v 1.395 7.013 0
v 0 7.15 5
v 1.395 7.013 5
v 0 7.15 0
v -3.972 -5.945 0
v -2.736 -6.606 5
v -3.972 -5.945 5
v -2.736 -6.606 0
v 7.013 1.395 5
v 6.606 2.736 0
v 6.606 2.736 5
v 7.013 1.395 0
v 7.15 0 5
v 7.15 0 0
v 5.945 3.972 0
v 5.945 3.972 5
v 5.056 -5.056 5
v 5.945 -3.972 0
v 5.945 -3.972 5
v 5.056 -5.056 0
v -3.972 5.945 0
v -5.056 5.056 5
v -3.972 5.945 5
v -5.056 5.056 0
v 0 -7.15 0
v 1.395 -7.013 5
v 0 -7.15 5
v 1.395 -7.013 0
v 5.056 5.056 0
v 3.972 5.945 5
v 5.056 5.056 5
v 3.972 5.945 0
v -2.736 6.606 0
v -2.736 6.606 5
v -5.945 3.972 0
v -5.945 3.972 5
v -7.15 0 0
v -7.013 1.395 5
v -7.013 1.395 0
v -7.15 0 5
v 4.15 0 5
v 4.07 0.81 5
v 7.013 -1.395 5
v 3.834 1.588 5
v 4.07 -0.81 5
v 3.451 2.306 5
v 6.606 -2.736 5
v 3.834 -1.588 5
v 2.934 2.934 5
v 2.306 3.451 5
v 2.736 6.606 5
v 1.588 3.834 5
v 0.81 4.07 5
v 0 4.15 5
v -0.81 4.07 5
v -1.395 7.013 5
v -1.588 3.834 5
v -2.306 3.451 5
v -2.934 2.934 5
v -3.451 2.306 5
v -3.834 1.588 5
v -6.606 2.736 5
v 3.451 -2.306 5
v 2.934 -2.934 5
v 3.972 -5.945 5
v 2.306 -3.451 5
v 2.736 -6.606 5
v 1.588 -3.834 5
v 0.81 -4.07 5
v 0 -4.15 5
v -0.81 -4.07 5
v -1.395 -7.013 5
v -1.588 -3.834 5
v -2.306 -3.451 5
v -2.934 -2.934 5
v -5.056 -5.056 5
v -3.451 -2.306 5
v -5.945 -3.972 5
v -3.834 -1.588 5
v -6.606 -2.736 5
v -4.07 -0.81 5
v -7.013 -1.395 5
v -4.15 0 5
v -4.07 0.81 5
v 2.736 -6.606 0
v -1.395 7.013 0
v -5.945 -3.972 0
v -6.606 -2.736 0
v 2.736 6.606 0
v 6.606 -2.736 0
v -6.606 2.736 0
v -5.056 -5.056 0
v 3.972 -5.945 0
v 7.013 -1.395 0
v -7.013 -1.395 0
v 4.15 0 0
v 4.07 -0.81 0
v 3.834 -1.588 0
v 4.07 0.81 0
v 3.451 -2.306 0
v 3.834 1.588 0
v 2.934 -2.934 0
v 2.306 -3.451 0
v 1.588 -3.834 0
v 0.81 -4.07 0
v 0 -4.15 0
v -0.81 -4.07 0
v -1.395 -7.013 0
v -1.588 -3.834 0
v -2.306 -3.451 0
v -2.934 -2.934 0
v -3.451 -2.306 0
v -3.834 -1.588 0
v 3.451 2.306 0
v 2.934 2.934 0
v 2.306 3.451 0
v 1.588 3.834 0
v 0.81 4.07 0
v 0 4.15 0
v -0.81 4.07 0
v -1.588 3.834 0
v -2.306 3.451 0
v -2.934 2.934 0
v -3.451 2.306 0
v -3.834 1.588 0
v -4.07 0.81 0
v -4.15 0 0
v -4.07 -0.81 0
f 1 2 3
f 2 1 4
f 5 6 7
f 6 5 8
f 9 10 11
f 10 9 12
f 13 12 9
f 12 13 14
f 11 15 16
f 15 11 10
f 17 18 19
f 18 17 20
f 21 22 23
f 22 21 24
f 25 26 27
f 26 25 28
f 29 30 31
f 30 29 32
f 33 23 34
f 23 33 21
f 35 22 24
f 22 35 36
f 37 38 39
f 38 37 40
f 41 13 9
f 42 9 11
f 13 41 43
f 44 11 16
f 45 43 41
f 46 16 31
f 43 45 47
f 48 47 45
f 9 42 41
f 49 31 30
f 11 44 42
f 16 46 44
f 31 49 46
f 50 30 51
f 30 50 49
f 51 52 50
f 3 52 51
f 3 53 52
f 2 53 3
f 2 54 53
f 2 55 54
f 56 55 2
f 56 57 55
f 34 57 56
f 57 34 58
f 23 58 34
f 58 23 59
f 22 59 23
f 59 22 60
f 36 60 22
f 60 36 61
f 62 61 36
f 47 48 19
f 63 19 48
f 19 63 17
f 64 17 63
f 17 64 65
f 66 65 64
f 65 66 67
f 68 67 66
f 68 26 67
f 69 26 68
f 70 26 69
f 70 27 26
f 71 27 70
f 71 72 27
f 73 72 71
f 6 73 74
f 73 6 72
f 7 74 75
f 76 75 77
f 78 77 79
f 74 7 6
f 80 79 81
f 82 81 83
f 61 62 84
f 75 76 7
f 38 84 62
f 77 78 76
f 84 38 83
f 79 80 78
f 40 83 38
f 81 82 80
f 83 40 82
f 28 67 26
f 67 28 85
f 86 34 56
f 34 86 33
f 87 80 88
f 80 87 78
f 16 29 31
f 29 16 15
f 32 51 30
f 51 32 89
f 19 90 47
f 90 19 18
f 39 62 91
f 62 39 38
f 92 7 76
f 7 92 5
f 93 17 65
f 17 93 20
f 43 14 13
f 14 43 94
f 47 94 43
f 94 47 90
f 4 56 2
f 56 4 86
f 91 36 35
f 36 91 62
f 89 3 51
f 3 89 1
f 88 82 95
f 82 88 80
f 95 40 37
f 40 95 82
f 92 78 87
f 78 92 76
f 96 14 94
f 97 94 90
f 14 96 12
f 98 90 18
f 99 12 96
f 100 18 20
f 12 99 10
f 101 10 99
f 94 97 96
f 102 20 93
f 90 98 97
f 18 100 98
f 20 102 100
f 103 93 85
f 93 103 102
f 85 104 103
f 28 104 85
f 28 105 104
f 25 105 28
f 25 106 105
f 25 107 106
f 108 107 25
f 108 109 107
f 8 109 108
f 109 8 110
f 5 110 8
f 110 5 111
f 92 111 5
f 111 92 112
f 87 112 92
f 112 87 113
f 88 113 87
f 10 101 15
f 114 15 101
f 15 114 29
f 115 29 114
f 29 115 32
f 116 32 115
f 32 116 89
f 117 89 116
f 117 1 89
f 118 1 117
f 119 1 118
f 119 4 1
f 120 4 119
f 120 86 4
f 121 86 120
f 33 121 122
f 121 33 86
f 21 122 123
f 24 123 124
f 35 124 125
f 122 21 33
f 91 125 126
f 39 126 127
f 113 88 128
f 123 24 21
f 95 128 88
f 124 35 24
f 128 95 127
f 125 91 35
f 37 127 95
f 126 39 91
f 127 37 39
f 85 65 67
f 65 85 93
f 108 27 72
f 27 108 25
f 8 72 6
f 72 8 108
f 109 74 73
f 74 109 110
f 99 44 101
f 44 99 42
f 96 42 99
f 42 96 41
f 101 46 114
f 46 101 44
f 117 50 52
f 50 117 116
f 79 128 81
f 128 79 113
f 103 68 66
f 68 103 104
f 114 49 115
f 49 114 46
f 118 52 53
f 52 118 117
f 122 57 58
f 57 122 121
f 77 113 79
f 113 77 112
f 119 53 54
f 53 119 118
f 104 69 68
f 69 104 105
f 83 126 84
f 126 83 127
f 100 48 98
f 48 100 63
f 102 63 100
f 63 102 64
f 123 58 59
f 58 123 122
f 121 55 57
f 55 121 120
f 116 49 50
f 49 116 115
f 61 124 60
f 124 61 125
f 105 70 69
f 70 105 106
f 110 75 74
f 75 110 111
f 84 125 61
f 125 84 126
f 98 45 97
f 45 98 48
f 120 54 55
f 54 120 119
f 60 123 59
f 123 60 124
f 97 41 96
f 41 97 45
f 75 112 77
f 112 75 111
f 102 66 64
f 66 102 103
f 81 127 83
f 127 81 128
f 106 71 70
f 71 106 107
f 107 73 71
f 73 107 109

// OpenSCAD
$fn = 32;

// ----------------------------------------------------------------------
// Spacer sleeve: 14.3 / 8.3 x 5 mm
// ----------------------------------------------------------------------

// --- parameters (mm) ---
tube_d = 14.3;            // outside diameter
bore_d = 8.3;             // shaft bore
tube_l = 5;               // sleeve length
step_d = 12.5;            // reduced diameter
step_l = 2.05;            // length of the step

module sleeve() {
  cylinder(h = tube_l, d = tube_d);
  translate([0, 0, tube_l - step_l]) cylinder(h = step_l, d = step_d);
}

difference() {
  sleeve();
  translate([0, 0, -1]) cylinder(h = tube_l + 2, d = bore_d);
}
